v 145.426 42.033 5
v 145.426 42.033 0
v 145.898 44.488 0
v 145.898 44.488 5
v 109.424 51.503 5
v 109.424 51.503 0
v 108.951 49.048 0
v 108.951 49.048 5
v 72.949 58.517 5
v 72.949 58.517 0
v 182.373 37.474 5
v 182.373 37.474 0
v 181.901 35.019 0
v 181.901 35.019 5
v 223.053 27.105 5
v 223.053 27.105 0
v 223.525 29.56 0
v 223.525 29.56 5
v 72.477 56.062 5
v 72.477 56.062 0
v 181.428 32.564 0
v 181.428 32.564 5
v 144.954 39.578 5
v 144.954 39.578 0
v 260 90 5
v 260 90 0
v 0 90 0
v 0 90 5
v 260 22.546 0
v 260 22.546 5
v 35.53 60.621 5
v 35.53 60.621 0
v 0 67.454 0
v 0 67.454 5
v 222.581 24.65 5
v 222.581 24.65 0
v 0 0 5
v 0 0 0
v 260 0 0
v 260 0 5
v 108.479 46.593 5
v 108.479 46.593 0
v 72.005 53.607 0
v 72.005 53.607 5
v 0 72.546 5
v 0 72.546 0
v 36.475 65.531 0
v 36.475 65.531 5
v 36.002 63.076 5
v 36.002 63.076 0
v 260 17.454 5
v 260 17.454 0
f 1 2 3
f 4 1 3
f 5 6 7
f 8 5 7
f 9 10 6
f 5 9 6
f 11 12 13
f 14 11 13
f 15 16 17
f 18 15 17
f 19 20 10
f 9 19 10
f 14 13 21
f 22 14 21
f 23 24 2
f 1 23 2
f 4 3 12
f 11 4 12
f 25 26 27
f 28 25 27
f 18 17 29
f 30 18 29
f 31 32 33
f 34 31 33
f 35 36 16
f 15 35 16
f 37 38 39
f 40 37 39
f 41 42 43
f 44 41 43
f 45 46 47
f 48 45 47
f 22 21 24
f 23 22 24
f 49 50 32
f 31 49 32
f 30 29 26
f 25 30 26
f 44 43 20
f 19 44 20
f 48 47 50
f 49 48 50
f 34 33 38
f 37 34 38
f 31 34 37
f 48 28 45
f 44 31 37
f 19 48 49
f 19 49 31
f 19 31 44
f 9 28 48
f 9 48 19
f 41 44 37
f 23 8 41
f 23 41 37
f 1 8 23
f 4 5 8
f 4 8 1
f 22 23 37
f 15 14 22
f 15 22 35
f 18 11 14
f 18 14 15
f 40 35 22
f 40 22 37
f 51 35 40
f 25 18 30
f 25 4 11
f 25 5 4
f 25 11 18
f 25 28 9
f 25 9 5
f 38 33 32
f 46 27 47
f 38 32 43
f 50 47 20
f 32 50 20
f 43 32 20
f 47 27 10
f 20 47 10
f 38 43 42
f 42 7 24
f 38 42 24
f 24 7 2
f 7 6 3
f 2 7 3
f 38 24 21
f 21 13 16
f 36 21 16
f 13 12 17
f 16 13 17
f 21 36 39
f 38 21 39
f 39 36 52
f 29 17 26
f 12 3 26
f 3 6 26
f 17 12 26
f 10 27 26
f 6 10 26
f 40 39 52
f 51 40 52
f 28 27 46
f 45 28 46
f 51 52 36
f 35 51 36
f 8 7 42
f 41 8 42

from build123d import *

# Parameters (mm, degrees)
BOSS_EXTRU_1_DEPTH = 5


with BuildPart() as part:
    # Esquisse1 → Boss.-Extru.1 (new body)
    with BuildSketch(Plane.XY):
        Polygon((0, 0), (260, 0), (260, 17.454191866), (222.581237858, 24.650107663), (223.053356342, 27.10512378), (223.525474826, 29.560139898), (260, 22.545808134), (260, 90), (0, 90), (0, 72.545808134), (36.474525174, 65.531476369), (36.002406689, 63.076460252), (35.530288205, 60.621444135), (0, 67.454191866), align=None)
        Polygon((72.476931863, 56.062128488), (72.949050347, 58.517144605), (109.423575521, 51.502812841), (108.951457037, 49.047796724), (108.479338552, 46.592780606), (72.004813379, 53.60711237), align=None, mode=Mode.SUBTRACT)
        Polygon((145.42598221, 42.03346496), (145.898100694, 44.488481077), (182.372625868, 37.474149313), (181.900507384, 35.019133195), (181.4283889, 32.564117078), (144.953863726, 39.578448842), align=None, mode=Mode.SUBTRACT)
    extrude(amount=BOSS_EXTRU_1_DEPTH)


solid = part.part
